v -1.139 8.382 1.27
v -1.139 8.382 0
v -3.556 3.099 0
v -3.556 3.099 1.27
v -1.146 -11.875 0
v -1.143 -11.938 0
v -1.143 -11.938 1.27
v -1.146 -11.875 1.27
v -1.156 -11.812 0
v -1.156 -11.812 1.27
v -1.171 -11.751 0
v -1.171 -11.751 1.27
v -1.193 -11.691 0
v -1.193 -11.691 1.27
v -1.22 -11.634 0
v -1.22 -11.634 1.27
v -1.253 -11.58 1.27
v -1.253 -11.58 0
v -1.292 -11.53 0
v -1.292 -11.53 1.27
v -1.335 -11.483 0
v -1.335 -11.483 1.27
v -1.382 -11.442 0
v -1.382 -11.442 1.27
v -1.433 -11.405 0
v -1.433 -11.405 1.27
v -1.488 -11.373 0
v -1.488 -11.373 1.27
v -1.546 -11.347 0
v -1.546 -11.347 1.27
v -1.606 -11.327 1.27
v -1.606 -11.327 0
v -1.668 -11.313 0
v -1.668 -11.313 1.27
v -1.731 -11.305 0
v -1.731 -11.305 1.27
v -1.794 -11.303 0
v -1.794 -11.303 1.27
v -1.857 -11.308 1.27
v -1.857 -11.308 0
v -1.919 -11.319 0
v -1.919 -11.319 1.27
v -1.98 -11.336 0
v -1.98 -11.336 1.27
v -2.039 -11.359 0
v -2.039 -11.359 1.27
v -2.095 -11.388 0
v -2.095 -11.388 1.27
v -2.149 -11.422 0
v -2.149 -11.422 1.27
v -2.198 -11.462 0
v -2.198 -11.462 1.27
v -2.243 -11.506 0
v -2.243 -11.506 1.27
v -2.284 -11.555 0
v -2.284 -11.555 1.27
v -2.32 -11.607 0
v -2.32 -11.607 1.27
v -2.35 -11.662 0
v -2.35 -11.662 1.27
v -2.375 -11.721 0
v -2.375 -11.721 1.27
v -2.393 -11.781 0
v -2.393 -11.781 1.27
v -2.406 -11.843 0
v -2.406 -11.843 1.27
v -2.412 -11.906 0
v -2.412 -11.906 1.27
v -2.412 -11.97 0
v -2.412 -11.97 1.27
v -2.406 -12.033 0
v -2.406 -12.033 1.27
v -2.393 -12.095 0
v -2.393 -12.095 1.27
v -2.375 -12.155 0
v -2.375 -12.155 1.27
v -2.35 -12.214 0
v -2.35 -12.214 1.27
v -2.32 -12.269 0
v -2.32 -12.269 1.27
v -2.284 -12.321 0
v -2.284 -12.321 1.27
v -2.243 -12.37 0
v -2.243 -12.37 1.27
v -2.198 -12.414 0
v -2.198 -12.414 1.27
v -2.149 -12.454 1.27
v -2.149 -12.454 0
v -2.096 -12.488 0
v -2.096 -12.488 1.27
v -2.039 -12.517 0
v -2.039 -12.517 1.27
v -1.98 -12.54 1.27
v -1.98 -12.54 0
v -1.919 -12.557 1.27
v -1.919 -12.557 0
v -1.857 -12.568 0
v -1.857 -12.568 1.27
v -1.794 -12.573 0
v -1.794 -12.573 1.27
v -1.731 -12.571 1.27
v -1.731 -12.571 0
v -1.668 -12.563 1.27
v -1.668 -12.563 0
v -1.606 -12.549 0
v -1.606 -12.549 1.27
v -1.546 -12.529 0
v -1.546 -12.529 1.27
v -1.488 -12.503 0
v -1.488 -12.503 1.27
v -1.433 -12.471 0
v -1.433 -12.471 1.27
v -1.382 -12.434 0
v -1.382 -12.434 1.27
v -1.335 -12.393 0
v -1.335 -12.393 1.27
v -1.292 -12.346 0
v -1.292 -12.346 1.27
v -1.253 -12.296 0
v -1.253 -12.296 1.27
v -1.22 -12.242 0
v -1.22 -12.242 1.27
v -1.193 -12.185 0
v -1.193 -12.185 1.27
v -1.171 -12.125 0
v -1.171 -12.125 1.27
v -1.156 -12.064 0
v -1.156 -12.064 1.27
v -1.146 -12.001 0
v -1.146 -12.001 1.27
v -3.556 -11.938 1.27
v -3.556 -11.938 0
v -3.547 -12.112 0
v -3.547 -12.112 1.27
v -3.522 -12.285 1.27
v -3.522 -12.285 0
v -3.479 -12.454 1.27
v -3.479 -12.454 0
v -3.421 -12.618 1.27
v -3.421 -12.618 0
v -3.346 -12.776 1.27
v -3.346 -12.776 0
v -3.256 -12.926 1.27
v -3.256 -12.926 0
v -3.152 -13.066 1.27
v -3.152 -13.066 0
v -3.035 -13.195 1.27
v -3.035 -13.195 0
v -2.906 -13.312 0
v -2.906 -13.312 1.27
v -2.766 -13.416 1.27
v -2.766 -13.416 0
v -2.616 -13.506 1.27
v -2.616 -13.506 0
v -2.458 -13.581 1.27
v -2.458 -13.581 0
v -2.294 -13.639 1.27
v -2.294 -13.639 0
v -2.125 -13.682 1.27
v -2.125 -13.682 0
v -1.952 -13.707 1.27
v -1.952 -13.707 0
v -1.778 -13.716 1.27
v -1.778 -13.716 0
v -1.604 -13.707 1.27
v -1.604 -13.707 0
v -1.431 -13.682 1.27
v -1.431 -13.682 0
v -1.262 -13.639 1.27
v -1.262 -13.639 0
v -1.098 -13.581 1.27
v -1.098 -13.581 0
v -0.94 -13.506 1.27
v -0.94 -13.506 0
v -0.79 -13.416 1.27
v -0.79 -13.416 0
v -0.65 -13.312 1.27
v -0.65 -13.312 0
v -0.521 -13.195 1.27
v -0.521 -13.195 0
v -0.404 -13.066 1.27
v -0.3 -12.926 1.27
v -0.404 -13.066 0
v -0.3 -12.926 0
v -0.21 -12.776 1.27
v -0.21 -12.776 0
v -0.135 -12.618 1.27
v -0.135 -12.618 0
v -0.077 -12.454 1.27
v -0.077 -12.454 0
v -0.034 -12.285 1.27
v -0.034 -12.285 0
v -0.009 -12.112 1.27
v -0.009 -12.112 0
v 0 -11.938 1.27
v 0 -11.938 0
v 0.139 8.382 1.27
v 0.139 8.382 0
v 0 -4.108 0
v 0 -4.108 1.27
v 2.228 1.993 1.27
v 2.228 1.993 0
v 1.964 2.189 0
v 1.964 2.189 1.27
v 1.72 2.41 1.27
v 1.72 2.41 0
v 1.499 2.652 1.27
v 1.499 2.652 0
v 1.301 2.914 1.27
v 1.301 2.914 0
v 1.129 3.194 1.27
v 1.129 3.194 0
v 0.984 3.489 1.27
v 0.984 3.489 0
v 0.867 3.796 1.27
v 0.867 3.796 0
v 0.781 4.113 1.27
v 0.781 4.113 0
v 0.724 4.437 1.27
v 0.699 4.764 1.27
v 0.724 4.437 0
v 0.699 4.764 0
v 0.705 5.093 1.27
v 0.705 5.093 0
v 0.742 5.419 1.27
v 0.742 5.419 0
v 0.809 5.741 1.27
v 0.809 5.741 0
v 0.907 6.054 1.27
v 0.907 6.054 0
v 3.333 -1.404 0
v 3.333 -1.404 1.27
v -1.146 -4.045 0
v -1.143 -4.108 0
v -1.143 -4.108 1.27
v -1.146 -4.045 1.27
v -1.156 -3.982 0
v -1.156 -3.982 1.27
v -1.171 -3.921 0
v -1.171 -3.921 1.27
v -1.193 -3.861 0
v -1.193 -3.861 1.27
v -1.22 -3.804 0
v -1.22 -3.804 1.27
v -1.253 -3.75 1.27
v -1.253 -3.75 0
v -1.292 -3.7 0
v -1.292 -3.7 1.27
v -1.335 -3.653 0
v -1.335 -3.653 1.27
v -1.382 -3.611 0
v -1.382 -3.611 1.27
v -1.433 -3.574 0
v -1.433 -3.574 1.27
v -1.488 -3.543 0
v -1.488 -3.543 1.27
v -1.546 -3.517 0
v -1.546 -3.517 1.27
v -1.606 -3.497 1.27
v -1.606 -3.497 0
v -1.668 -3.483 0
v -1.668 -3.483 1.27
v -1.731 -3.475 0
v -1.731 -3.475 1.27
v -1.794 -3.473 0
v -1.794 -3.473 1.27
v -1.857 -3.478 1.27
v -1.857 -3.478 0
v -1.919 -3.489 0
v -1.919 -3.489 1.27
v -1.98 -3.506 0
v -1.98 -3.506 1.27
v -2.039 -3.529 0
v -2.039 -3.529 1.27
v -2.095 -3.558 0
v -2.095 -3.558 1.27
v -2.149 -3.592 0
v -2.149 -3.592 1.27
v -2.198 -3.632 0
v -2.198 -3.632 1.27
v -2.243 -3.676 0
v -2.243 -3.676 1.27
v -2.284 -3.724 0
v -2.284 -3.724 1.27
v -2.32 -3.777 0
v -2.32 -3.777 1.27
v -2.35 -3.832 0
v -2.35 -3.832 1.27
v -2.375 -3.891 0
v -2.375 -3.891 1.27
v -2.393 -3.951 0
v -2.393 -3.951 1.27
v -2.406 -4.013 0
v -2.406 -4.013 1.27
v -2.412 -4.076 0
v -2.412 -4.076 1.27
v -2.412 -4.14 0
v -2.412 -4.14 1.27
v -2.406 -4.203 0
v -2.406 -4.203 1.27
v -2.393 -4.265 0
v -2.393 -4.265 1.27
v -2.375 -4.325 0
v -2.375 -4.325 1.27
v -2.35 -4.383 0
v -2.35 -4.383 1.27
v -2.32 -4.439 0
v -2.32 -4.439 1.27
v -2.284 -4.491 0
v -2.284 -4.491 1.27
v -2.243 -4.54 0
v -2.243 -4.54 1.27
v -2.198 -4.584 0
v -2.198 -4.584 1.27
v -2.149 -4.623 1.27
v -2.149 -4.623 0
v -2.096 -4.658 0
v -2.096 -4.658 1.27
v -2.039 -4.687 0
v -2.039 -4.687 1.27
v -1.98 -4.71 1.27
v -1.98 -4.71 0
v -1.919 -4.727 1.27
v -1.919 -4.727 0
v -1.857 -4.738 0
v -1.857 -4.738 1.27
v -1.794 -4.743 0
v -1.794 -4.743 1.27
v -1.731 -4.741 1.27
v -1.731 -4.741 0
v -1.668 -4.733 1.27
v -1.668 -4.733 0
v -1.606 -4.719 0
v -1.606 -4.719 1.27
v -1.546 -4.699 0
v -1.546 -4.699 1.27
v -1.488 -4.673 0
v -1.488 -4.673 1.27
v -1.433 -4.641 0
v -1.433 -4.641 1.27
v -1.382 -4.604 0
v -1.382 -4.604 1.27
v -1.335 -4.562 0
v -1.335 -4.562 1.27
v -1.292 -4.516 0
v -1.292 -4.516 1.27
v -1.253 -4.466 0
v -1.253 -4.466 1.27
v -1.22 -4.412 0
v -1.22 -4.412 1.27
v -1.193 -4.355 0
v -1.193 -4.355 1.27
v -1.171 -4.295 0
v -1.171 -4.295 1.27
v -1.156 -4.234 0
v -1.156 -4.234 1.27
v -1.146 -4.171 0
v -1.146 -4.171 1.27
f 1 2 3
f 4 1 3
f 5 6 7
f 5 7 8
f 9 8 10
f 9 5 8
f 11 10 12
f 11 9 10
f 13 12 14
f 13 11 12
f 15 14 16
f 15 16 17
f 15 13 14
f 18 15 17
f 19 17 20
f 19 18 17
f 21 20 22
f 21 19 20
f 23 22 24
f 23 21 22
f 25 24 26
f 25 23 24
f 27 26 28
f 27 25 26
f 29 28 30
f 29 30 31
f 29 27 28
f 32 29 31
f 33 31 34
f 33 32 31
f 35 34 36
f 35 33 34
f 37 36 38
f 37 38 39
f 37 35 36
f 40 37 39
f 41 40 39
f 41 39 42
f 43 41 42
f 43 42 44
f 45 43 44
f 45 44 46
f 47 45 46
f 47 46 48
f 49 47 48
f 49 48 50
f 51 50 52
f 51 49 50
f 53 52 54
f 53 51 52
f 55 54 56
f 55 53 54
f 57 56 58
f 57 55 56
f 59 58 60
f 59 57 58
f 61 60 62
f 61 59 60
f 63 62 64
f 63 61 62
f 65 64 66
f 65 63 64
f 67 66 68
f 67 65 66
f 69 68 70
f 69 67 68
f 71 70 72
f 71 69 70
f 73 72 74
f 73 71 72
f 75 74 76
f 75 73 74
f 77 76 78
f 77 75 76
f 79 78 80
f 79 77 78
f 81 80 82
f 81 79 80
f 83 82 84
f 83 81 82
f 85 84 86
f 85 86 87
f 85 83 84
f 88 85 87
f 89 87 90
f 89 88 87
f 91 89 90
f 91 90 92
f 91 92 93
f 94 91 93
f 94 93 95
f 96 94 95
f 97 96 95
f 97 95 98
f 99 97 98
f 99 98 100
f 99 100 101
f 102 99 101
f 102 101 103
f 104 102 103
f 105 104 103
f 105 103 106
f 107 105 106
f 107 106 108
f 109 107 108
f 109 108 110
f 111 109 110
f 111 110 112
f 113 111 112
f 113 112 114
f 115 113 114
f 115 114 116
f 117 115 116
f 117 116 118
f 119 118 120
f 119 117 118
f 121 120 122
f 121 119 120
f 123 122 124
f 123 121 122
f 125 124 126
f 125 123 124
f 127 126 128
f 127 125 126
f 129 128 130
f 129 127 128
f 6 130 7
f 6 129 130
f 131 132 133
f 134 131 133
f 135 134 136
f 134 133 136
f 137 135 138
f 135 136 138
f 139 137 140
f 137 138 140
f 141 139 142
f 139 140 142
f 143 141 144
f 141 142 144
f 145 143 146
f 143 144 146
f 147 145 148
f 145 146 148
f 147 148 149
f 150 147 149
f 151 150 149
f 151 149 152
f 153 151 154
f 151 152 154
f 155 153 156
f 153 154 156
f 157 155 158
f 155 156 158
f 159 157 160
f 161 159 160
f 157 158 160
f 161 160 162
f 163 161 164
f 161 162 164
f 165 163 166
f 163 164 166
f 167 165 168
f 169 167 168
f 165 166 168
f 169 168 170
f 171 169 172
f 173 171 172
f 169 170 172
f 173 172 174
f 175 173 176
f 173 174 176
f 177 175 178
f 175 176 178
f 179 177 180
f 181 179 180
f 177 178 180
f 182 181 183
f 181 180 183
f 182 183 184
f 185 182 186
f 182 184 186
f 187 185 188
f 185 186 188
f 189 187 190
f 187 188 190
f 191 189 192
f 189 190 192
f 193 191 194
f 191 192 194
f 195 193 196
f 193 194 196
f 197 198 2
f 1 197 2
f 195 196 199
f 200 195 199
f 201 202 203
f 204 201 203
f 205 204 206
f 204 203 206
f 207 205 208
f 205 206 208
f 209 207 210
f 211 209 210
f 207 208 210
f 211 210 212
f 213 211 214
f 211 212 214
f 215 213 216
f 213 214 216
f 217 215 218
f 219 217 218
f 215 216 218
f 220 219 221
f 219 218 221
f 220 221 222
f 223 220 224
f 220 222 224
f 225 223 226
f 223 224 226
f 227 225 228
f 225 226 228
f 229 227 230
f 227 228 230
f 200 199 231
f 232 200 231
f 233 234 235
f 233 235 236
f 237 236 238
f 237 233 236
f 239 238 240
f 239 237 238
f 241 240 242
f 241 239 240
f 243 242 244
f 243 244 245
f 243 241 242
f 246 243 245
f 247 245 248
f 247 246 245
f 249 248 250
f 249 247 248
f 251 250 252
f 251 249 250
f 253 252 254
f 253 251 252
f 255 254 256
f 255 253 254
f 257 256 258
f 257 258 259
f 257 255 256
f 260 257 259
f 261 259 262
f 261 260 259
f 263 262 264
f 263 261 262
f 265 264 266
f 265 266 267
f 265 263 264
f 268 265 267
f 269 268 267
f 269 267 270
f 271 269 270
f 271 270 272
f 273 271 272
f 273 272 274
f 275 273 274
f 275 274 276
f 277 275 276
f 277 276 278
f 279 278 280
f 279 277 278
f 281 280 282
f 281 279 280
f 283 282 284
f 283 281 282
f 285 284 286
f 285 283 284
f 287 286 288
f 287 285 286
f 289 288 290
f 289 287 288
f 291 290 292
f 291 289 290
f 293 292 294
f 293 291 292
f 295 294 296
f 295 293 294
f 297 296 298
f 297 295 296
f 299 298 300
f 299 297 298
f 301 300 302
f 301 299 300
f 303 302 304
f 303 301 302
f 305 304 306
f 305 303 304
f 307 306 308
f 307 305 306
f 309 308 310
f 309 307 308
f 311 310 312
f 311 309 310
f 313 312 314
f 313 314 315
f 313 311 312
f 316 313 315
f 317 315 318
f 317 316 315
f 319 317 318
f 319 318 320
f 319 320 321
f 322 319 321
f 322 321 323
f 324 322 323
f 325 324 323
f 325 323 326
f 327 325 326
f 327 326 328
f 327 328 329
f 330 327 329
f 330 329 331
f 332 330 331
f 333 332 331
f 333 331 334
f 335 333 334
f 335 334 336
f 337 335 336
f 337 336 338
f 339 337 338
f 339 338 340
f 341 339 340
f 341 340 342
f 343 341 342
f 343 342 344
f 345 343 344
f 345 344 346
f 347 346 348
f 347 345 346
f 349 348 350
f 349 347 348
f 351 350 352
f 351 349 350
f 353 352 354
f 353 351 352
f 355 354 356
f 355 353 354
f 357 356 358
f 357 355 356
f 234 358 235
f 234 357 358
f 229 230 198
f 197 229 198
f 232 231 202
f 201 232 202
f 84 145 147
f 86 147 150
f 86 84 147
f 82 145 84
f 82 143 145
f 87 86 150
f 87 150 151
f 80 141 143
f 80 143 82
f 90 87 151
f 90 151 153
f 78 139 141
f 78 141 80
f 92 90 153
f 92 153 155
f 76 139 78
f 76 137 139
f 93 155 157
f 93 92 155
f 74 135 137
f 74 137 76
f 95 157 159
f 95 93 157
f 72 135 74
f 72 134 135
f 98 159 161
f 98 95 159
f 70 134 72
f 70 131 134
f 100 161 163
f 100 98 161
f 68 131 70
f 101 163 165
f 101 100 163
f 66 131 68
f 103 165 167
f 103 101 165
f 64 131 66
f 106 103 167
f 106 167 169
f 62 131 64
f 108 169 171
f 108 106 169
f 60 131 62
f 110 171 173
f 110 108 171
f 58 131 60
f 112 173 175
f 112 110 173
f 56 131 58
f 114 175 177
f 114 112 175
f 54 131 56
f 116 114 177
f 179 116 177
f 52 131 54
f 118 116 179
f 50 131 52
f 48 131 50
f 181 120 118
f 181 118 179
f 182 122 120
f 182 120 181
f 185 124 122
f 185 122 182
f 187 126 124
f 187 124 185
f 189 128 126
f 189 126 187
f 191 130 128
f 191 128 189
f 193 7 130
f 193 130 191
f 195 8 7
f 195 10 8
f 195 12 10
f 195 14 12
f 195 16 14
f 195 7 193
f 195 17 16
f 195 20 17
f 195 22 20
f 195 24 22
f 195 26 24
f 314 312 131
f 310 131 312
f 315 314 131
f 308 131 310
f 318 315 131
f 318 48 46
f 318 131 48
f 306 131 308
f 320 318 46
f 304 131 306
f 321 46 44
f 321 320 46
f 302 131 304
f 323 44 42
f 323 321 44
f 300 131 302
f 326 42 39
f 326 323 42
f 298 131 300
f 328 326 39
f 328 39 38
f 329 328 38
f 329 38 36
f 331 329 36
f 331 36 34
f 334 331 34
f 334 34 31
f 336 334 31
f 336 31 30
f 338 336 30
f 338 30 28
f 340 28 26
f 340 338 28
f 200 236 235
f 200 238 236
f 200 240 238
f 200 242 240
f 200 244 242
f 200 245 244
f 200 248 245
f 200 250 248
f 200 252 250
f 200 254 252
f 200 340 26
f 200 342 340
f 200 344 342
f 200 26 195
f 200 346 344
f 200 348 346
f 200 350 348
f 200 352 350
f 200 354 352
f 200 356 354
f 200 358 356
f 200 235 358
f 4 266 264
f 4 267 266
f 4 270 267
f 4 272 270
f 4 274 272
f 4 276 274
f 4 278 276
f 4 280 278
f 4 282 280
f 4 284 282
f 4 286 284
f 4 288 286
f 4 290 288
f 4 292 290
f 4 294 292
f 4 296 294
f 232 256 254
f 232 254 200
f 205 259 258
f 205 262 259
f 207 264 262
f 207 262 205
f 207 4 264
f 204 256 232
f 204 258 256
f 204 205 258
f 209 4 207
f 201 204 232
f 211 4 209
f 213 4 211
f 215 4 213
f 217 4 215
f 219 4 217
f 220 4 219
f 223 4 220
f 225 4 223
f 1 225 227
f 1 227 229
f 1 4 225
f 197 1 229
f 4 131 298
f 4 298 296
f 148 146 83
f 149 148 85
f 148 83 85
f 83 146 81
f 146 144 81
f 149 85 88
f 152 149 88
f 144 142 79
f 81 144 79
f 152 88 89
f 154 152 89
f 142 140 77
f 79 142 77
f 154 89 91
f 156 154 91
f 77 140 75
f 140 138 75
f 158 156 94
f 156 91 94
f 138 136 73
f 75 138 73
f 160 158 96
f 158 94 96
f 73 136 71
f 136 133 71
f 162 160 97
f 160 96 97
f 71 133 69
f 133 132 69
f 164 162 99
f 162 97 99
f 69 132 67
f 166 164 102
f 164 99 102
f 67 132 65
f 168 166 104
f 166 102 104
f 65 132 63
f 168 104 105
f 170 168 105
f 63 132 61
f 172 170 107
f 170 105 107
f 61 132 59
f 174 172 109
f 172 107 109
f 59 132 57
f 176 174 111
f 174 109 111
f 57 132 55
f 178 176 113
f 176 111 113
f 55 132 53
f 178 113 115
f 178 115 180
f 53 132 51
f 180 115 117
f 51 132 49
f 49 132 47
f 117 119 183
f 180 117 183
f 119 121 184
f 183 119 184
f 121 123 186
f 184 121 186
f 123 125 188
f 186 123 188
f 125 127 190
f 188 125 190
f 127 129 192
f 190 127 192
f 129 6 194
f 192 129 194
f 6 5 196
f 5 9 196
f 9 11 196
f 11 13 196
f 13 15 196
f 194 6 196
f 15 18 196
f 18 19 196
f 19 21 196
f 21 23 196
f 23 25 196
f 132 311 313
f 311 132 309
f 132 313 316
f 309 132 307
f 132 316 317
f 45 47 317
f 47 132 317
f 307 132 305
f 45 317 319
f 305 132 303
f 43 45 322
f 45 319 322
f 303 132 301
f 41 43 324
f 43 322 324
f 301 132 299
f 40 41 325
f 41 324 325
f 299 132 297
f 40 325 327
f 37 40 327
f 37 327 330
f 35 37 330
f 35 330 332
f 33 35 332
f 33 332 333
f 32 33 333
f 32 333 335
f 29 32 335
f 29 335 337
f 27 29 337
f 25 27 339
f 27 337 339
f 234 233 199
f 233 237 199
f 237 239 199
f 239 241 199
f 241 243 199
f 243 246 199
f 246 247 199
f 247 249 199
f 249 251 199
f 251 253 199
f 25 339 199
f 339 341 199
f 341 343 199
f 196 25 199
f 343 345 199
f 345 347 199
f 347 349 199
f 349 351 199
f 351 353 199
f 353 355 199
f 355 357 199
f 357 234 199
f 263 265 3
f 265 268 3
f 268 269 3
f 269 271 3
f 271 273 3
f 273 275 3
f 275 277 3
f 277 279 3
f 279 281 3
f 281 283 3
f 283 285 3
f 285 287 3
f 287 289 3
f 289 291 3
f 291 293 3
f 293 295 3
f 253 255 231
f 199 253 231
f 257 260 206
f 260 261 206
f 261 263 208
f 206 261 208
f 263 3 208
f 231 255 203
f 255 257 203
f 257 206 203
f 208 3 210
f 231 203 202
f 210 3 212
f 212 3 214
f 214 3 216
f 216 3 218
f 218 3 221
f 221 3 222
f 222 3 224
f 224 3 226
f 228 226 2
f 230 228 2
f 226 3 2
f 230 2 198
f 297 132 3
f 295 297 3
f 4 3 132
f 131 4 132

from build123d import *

# Parameters (mm, degrees)
SKETCH1_R           = 0.635
BOSS_EXTRUDE1_DEPTH = 1.27


with BuildPart() as part:
    # Sketch1 → Boss-Extrude1 (new body)
    with BuildSketch(Plane.XY):
        with BuildLine():
            Line((0, -11.938), (0, -4.107900924))
            Line((0, -4.107900924), (3.332623342, -1.403875353))
            Line((3.332623342, -1.403875353), (2.227712005, 1.993118473))
            ThreePointArc((2.227712005, 1.993118473), (0.867392125, 3.796133525), (0.906732127, 6.054404062))
            Line((0.906732127, 6.054404062), (0.139174217, 8.382))
            Line((0.139174217, 8.382), (-1.138657386, 8.382))
            Line((-1.138657386, 8.382), (-3.556, 3.099290623))
            Line((-3.556, 3.099290623), (-3.556, -11.938))
            ThreePointArc((-3.556, -11.938), (-1.778, -13.716), (0, -11.938))
        make_face()
        with Locations((-1.778, -11.938)):
            Circle(SKETCH1_R, mode=Mode.SUBTRACT)
        with Locations((-1.778, -4.107900924)):
            Circle(SKETCH1_R, mode=Mode.SUBTRACT)
    extrude(amount=BOSS_EXTRUDE1_DEPTH)


solid = part.part
